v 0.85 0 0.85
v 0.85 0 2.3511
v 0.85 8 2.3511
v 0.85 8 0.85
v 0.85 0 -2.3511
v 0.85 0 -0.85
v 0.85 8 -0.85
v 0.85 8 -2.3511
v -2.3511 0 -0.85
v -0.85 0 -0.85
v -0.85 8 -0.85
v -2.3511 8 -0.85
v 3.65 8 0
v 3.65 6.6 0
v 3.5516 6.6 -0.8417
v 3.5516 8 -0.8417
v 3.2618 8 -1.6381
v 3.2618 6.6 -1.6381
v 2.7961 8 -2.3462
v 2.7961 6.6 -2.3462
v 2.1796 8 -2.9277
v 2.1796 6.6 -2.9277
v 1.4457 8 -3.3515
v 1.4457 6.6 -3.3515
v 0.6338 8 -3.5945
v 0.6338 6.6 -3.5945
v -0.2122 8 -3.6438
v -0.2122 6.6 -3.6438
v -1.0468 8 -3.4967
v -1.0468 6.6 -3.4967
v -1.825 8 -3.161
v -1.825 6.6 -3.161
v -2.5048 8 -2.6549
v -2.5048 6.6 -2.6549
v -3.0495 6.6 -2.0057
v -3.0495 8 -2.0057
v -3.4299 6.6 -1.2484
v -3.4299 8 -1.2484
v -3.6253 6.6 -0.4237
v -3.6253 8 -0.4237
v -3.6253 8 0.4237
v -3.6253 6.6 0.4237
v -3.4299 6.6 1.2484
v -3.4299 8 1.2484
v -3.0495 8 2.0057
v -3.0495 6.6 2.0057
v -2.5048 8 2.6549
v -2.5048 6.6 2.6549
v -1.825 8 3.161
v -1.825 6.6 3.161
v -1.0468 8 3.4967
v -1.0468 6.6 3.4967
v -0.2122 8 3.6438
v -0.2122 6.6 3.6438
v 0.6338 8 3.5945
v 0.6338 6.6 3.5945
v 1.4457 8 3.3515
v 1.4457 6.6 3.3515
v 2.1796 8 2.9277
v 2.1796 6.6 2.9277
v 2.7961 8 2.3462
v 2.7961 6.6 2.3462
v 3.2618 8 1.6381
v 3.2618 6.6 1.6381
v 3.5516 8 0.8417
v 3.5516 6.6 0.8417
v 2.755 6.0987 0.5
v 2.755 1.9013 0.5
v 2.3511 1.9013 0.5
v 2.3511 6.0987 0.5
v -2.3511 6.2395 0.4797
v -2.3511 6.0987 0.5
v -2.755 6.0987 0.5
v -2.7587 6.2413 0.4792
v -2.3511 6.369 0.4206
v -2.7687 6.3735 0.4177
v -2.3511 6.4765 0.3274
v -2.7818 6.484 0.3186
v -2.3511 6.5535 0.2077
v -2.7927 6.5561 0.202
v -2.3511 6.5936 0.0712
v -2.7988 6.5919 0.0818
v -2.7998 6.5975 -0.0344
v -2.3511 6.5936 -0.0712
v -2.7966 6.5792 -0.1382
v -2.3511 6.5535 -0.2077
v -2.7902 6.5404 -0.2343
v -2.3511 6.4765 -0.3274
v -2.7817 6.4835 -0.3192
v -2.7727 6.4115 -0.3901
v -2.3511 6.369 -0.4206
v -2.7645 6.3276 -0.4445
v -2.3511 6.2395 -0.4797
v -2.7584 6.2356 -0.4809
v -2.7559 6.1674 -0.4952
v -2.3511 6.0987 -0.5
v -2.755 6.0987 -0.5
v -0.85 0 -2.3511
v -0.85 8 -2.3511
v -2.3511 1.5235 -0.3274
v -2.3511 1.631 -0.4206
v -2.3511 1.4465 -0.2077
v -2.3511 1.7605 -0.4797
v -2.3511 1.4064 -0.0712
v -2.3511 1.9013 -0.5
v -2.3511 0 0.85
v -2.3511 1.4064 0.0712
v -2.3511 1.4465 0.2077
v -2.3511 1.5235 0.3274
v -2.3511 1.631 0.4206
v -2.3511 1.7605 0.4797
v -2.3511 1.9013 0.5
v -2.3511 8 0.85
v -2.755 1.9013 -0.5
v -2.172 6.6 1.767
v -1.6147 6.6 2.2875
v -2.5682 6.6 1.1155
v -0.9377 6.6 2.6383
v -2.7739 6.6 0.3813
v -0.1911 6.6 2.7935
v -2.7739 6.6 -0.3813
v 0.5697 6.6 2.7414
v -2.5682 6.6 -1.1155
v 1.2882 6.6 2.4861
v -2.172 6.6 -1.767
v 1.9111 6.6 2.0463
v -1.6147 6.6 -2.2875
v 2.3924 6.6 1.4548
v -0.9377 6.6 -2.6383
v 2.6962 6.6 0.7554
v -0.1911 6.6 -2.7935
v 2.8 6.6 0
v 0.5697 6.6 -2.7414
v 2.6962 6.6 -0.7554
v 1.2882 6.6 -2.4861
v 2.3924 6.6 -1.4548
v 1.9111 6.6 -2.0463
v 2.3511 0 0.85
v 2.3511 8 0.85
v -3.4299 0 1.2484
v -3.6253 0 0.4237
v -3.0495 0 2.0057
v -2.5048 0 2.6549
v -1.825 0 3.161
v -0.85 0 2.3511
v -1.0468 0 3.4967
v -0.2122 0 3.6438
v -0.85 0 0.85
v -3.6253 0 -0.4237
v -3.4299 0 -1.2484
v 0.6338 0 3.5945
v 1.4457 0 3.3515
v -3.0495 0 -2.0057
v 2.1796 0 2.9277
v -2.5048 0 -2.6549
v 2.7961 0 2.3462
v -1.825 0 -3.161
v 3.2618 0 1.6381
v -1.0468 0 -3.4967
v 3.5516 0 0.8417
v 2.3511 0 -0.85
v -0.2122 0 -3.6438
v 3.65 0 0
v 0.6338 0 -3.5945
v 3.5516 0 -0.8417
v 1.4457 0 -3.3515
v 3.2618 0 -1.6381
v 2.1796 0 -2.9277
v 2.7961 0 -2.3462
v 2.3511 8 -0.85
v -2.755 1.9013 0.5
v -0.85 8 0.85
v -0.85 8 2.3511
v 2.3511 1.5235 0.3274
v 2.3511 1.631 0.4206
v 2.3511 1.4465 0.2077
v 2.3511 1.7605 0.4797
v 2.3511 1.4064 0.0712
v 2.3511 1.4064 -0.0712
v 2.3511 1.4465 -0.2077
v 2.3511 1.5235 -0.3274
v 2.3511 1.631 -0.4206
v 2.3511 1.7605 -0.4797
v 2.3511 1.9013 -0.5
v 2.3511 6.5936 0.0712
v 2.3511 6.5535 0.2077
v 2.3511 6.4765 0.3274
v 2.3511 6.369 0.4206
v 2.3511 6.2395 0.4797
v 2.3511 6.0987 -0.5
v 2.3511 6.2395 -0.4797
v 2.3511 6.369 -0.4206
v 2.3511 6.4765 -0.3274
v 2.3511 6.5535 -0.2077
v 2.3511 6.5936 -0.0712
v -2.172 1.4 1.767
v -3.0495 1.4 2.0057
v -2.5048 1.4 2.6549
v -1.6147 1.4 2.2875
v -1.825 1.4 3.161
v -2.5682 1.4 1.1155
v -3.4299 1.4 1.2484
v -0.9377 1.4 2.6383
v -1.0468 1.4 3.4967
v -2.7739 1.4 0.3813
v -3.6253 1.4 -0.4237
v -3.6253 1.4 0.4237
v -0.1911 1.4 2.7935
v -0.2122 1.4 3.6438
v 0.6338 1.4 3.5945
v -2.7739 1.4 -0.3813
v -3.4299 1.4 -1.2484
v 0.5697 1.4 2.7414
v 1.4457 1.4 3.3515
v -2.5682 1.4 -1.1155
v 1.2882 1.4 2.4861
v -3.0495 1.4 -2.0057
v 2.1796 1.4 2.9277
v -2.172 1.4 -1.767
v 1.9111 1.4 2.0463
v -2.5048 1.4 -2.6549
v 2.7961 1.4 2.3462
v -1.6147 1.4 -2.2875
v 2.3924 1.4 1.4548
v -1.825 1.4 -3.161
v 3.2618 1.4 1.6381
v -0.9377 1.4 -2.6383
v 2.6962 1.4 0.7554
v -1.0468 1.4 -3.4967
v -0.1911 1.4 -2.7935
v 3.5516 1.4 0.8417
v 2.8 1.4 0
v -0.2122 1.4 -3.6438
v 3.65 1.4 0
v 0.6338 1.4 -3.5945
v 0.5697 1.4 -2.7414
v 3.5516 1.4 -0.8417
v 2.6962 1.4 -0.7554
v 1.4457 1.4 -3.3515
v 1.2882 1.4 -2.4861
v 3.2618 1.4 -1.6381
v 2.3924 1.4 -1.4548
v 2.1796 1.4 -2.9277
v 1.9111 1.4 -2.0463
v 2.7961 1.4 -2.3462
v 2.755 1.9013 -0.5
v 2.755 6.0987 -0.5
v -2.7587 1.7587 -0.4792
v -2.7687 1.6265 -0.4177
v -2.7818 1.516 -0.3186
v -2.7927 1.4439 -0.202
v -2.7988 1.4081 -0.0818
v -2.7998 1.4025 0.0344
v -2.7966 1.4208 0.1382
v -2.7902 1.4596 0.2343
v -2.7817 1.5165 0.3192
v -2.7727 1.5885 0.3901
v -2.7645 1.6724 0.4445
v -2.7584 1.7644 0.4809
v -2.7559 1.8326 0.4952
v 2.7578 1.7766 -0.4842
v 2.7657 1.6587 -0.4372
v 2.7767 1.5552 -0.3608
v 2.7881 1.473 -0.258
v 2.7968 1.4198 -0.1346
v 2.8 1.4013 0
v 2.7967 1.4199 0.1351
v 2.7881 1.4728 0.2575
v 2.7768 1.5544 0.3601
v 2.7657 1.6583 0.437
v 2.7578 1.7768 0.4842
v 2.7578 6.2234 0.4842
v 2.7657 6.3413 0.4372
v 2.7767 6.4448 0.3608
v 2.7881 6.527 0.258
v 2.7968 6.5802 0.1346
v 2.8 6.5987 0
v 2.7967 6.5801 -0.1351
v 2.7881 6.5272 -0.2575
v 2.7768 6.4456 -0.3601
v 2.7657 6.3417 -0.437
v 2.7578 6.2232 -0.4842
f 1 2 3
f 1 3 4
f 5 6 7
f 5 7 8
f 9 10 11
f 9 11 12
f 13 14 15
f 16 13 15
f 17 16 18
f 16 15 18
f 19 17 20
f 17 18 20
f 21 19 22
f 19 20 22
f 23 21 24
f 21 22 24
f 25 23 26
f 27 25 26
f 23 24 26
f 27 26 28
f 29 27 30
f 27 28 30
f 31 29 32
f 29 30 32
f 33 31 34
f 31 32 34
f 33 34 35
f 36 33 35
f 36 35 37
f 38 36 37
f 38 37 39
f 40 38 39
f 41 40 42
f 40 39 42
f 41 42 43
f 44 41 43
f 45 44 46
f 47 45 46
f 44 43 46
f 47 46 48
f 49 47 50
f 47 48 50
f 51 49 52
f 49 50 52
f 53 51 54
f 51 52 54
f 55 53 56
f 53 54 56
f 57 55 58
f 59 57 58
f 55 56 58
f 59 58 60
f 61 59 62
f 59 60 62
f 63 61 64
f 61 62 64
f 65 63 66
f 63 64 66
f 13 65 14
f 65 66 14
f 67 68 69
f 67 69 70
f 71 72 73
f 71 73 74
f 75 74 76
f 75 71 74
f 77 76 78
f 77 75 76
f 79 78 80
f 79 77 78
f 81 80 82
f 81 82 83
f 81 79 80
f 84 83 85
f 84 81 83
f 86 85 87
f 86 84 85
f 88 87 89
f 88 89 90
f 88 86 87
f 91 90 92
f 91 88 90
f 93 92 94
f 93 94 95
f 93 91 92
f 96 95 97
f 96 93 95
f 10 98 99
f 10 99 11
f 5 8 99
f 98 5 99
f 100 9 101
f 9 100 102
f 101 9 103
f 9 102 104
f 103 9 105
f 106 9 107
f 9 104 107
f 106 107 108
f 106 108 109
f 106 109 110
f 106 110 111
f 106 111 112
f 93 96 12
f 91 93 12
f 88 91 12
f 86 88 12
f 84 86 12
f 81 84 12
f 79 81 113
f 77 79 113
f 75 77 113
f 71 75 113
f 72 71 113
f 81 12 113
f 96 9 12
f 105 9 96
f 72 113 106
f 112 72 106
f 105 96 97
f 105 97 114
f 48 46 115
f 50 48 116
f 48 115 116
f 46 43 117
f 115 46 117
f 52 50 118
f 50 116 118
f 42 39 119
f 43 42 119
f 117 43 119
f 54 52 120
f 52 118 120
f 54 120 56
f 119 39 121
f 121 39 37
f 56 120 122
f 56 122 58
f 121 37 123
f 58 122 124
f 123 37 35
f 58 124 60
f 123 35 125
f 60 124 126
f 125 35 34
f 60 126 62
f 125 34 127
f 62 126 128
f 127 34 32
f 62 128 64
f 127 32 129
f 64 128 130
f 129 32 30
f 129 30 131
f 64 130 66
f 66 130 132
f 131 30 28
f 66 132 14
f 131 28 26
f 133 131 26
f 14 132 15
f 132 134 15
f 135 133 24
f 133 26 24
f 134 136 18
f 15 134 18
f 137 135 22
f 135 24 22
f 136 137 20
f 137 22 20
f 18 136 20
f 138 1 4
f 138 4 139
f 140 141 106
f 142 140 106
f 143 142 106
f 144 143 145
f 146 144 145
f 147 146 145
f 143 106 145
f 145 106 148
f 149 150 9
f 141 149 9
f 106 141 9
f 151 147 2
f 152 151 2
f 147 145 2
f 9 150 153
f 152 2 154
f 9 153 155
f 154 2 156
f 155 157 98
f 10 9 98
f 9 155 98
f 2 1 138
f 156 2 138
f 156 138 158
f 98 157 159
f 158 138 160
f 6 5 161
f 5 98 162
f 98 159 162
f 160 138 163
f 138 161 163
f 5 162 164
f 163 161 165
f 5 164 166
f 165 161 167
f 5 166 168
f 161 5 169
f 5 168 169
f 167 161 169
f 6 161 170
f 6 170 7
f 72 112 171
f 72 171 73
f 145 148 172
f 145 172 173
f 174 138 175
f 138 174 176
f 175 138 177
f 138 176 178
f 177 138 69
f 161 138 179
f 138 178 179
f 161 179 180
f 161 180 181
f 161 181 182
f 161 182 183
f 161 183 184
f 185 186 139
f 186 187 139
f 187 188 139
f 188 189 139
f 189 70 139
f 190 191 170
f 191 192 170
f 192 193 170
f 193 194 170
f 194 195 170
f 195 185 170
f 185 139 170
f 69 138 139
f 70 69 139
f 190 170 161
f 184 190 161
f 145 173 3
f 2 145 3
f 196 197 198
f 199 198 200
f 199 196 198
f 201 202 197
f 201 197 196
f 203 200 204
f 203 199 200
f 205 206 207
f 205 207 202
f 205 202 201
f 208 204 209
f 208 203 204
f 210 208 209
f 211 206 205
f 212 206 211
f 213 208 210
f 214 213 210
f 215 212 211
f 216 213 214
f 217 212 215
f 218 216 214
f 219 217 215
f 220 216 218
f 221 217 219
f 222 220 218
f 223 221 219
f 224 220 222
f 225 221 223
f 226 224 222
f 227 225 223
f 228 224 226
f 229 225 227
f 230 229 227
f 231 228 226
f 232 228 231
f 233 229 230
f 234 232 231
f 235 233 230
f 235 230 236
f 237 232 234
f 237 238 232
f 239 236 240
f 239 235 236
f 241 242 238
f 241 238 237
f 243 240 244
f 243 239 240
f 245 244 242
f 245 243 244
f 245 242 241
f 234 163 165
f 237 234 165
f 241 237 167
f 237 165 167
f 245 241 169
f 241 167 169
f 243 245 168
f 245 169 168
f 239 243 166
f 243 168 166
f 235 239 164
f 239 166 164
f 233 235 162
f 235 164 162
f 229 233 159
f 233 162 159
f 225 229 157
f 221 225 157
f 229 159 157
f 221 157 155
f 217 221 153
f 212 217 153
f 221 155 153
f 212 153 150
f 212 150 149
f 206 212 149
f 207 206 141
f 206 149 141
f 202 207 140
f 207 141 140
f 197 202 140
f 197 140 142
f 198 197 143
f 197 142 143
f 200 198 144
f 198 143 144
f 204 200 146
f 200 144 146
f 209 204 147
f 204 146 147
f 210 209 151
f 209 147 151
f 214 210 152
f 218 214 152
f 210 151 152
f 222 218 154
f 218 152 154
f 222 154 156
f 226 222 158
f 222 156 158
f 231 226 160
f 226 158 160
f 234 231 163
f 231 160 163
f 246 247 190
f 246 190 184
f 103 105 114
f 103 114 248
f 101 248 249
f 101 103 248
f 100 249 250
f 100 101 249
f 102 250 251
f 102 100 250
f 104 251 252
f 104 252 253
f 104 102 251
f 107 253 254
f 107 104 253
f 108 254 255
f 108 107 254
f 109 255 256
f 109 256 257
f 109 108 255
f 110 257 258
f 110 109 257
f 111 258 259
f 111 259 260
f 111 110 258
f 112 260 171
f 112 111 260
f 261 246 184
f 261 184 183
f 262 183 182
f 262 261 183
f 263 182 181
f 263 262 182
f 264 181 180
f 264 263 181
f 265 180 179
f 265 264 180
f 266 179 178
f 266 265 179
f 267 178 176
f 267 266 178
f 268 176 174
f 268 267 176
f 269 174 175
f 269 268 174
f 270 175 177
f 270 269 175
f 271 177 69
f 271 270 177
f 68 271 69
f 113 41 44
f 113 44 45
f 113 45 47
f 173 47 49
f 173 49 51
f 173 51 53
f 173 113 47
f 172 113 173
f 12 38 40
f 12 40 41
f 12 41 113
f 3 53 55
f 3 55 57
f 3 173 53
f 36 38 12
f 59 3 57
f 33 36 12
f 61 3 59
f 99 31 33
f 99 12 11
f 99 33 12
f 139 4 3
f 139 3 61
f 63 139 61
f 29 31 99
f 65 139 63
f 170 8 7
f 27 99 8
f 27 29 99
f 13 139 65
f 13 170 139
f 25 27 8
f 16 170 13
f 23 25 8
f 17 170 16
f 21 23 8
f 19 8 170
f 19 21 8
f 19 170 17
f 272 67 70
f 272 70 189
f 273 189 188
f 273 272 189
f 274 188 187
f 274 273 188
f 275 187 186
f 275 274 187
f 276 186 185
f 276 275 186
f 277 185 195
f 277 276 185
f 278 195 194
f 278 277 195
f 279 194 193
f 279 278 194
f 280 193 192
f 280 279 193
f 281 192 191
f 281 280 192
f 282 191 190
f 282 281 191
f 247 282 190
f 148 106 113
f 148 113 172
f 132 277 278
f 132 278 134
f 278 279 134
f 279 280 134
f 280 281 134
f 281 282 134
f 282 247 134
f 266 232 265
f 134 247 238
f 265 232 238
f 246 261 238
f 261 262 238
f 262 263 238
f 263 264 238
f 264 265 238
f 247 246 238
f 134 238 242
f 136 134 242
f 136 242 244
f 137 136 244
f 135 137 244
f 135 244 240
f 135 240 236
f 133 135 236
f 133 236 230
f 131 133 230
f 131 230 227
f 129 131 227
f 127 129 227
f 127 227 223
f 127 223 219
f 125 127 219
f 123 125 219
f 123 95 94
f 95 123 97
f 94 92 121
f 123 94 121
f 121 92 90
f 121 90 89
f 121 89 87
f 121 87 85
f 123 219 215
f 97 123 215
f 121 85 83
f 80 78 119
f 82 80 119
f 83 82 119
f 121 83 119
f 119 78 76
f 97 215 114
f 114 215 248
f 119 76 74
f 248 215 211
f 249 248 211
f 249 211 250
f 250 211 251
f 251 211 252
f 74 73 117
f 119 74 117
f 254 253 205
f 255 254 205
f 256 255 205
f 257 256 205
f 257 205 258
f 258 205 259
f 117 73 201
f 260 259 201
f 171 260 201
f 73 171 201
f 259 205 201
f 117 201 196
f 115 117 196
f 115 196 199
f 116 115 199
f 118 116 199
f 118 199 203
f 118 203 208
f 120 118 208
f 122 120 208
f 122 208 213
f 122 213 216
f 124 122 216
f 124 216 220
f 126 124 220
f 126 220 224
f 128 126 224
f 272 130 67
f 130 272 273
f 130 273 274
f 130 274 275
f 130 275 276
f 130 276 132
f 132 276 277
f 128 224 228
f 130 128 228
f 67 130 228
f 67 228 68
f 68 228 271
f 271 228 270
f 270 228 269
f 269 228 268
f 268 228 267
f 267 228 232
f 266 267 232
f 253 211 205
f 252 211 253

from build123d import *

# Parameters (mm, degrees)
SKETCH2_R           = 3.65
BOSS_EXTRUDE1_DEPTH = 1.4
SKETCH3_R           = 2.8
BOSS_EXTRUDE2_DEPTH = 5.2
SKETCH4_R           = 3.65
BOSS_EXTRUDE3_DEPTH = 1.4
CUT_EXTRUDE1_DEPTH  = 9
CUT_EXTRUDE2_DEPTH  = 14.65


with BuildPart() as part:
    # Sketch2 → Boss-Extrude1 (new body)
    with BuildSketch(Plane(origin=(0, 0, 0), x_dir=(1, 0, 0), z_dir=(0, 1, 0))):
        Circle(SKETCH2_R)
    extrude(amount=BOSS_EXTRUDE1_DEPTH)

    # Sketch3 → Boss-Extrude2 (add)
    with BuildSketch(Plane(origin=(0, 1.4, 0), x_dir=(1, 0, 0), z_dir=(0, 1, 0))):
        Circle(SKETCH3_R)
    extrude(amount=BOSS_EXTRUDE2_DEPTH)

    # Sketch4 → Boss-Extrude3 (add)
    with BuildSketch(Plane(origin=(0, 6.6, 0), x_dir=(1, 0, 0), z_dir=(0, 1, 0))):
        Circle(SKETCH4_R)
    extrude(amount=BOSS_EXTRUDE3_DEPTH)

    # Sketch5 → Cut-Extrude1 (cut, through all)
    with BuildSketch(Plane(origin=(0, 8, 0), x_dir=(1, 0, 0), z_dir=(0, 1, 0))):
        Polygon((0.85, -2.351063589), (0.85, -0.85), (2.351063589, -0.85), (2.351063589, 0.85), (0.85, 0.85), (0.85, 2.351063589), (-0.85, 2.351063589), (-0.85, 0.85), (-2.351063589, 0.85), (-2.351063589, -0.85), (-0.85, -0.85), (-0.85, -2.351063589), align=None)
    extrude(amount=-CUT_EXTRUDE1_DEPTH, mode=Mode.SUBTRACT)

    # Sketch6 → Cut-Extrude2 (cut, through all)
    with BuildSketch(Plane(origin=(10, 0, 0), x_dir=(0, 0, -1), z_dir=(1, 0, 0))):
        with BuildLine():
            Line((0.5, 6.098665366), (0.5, 1.901334634))
            ThreePointArc((0.5, 1.901334634), (0, 1.401334634), (-0.5, 1.901334634))
            Line((-0.5, 1.901334634), (-0.5, 6.098665366))
            ThreePointArc((-0.5, 6.098665366), (0, 6.598665366), (0.5, 6.098665366))
        make_face()
    extrude(amount=-CUT_EXTRUDE2_DEPTH, mode=Mode.SUBTRACT)


solid = part.part
